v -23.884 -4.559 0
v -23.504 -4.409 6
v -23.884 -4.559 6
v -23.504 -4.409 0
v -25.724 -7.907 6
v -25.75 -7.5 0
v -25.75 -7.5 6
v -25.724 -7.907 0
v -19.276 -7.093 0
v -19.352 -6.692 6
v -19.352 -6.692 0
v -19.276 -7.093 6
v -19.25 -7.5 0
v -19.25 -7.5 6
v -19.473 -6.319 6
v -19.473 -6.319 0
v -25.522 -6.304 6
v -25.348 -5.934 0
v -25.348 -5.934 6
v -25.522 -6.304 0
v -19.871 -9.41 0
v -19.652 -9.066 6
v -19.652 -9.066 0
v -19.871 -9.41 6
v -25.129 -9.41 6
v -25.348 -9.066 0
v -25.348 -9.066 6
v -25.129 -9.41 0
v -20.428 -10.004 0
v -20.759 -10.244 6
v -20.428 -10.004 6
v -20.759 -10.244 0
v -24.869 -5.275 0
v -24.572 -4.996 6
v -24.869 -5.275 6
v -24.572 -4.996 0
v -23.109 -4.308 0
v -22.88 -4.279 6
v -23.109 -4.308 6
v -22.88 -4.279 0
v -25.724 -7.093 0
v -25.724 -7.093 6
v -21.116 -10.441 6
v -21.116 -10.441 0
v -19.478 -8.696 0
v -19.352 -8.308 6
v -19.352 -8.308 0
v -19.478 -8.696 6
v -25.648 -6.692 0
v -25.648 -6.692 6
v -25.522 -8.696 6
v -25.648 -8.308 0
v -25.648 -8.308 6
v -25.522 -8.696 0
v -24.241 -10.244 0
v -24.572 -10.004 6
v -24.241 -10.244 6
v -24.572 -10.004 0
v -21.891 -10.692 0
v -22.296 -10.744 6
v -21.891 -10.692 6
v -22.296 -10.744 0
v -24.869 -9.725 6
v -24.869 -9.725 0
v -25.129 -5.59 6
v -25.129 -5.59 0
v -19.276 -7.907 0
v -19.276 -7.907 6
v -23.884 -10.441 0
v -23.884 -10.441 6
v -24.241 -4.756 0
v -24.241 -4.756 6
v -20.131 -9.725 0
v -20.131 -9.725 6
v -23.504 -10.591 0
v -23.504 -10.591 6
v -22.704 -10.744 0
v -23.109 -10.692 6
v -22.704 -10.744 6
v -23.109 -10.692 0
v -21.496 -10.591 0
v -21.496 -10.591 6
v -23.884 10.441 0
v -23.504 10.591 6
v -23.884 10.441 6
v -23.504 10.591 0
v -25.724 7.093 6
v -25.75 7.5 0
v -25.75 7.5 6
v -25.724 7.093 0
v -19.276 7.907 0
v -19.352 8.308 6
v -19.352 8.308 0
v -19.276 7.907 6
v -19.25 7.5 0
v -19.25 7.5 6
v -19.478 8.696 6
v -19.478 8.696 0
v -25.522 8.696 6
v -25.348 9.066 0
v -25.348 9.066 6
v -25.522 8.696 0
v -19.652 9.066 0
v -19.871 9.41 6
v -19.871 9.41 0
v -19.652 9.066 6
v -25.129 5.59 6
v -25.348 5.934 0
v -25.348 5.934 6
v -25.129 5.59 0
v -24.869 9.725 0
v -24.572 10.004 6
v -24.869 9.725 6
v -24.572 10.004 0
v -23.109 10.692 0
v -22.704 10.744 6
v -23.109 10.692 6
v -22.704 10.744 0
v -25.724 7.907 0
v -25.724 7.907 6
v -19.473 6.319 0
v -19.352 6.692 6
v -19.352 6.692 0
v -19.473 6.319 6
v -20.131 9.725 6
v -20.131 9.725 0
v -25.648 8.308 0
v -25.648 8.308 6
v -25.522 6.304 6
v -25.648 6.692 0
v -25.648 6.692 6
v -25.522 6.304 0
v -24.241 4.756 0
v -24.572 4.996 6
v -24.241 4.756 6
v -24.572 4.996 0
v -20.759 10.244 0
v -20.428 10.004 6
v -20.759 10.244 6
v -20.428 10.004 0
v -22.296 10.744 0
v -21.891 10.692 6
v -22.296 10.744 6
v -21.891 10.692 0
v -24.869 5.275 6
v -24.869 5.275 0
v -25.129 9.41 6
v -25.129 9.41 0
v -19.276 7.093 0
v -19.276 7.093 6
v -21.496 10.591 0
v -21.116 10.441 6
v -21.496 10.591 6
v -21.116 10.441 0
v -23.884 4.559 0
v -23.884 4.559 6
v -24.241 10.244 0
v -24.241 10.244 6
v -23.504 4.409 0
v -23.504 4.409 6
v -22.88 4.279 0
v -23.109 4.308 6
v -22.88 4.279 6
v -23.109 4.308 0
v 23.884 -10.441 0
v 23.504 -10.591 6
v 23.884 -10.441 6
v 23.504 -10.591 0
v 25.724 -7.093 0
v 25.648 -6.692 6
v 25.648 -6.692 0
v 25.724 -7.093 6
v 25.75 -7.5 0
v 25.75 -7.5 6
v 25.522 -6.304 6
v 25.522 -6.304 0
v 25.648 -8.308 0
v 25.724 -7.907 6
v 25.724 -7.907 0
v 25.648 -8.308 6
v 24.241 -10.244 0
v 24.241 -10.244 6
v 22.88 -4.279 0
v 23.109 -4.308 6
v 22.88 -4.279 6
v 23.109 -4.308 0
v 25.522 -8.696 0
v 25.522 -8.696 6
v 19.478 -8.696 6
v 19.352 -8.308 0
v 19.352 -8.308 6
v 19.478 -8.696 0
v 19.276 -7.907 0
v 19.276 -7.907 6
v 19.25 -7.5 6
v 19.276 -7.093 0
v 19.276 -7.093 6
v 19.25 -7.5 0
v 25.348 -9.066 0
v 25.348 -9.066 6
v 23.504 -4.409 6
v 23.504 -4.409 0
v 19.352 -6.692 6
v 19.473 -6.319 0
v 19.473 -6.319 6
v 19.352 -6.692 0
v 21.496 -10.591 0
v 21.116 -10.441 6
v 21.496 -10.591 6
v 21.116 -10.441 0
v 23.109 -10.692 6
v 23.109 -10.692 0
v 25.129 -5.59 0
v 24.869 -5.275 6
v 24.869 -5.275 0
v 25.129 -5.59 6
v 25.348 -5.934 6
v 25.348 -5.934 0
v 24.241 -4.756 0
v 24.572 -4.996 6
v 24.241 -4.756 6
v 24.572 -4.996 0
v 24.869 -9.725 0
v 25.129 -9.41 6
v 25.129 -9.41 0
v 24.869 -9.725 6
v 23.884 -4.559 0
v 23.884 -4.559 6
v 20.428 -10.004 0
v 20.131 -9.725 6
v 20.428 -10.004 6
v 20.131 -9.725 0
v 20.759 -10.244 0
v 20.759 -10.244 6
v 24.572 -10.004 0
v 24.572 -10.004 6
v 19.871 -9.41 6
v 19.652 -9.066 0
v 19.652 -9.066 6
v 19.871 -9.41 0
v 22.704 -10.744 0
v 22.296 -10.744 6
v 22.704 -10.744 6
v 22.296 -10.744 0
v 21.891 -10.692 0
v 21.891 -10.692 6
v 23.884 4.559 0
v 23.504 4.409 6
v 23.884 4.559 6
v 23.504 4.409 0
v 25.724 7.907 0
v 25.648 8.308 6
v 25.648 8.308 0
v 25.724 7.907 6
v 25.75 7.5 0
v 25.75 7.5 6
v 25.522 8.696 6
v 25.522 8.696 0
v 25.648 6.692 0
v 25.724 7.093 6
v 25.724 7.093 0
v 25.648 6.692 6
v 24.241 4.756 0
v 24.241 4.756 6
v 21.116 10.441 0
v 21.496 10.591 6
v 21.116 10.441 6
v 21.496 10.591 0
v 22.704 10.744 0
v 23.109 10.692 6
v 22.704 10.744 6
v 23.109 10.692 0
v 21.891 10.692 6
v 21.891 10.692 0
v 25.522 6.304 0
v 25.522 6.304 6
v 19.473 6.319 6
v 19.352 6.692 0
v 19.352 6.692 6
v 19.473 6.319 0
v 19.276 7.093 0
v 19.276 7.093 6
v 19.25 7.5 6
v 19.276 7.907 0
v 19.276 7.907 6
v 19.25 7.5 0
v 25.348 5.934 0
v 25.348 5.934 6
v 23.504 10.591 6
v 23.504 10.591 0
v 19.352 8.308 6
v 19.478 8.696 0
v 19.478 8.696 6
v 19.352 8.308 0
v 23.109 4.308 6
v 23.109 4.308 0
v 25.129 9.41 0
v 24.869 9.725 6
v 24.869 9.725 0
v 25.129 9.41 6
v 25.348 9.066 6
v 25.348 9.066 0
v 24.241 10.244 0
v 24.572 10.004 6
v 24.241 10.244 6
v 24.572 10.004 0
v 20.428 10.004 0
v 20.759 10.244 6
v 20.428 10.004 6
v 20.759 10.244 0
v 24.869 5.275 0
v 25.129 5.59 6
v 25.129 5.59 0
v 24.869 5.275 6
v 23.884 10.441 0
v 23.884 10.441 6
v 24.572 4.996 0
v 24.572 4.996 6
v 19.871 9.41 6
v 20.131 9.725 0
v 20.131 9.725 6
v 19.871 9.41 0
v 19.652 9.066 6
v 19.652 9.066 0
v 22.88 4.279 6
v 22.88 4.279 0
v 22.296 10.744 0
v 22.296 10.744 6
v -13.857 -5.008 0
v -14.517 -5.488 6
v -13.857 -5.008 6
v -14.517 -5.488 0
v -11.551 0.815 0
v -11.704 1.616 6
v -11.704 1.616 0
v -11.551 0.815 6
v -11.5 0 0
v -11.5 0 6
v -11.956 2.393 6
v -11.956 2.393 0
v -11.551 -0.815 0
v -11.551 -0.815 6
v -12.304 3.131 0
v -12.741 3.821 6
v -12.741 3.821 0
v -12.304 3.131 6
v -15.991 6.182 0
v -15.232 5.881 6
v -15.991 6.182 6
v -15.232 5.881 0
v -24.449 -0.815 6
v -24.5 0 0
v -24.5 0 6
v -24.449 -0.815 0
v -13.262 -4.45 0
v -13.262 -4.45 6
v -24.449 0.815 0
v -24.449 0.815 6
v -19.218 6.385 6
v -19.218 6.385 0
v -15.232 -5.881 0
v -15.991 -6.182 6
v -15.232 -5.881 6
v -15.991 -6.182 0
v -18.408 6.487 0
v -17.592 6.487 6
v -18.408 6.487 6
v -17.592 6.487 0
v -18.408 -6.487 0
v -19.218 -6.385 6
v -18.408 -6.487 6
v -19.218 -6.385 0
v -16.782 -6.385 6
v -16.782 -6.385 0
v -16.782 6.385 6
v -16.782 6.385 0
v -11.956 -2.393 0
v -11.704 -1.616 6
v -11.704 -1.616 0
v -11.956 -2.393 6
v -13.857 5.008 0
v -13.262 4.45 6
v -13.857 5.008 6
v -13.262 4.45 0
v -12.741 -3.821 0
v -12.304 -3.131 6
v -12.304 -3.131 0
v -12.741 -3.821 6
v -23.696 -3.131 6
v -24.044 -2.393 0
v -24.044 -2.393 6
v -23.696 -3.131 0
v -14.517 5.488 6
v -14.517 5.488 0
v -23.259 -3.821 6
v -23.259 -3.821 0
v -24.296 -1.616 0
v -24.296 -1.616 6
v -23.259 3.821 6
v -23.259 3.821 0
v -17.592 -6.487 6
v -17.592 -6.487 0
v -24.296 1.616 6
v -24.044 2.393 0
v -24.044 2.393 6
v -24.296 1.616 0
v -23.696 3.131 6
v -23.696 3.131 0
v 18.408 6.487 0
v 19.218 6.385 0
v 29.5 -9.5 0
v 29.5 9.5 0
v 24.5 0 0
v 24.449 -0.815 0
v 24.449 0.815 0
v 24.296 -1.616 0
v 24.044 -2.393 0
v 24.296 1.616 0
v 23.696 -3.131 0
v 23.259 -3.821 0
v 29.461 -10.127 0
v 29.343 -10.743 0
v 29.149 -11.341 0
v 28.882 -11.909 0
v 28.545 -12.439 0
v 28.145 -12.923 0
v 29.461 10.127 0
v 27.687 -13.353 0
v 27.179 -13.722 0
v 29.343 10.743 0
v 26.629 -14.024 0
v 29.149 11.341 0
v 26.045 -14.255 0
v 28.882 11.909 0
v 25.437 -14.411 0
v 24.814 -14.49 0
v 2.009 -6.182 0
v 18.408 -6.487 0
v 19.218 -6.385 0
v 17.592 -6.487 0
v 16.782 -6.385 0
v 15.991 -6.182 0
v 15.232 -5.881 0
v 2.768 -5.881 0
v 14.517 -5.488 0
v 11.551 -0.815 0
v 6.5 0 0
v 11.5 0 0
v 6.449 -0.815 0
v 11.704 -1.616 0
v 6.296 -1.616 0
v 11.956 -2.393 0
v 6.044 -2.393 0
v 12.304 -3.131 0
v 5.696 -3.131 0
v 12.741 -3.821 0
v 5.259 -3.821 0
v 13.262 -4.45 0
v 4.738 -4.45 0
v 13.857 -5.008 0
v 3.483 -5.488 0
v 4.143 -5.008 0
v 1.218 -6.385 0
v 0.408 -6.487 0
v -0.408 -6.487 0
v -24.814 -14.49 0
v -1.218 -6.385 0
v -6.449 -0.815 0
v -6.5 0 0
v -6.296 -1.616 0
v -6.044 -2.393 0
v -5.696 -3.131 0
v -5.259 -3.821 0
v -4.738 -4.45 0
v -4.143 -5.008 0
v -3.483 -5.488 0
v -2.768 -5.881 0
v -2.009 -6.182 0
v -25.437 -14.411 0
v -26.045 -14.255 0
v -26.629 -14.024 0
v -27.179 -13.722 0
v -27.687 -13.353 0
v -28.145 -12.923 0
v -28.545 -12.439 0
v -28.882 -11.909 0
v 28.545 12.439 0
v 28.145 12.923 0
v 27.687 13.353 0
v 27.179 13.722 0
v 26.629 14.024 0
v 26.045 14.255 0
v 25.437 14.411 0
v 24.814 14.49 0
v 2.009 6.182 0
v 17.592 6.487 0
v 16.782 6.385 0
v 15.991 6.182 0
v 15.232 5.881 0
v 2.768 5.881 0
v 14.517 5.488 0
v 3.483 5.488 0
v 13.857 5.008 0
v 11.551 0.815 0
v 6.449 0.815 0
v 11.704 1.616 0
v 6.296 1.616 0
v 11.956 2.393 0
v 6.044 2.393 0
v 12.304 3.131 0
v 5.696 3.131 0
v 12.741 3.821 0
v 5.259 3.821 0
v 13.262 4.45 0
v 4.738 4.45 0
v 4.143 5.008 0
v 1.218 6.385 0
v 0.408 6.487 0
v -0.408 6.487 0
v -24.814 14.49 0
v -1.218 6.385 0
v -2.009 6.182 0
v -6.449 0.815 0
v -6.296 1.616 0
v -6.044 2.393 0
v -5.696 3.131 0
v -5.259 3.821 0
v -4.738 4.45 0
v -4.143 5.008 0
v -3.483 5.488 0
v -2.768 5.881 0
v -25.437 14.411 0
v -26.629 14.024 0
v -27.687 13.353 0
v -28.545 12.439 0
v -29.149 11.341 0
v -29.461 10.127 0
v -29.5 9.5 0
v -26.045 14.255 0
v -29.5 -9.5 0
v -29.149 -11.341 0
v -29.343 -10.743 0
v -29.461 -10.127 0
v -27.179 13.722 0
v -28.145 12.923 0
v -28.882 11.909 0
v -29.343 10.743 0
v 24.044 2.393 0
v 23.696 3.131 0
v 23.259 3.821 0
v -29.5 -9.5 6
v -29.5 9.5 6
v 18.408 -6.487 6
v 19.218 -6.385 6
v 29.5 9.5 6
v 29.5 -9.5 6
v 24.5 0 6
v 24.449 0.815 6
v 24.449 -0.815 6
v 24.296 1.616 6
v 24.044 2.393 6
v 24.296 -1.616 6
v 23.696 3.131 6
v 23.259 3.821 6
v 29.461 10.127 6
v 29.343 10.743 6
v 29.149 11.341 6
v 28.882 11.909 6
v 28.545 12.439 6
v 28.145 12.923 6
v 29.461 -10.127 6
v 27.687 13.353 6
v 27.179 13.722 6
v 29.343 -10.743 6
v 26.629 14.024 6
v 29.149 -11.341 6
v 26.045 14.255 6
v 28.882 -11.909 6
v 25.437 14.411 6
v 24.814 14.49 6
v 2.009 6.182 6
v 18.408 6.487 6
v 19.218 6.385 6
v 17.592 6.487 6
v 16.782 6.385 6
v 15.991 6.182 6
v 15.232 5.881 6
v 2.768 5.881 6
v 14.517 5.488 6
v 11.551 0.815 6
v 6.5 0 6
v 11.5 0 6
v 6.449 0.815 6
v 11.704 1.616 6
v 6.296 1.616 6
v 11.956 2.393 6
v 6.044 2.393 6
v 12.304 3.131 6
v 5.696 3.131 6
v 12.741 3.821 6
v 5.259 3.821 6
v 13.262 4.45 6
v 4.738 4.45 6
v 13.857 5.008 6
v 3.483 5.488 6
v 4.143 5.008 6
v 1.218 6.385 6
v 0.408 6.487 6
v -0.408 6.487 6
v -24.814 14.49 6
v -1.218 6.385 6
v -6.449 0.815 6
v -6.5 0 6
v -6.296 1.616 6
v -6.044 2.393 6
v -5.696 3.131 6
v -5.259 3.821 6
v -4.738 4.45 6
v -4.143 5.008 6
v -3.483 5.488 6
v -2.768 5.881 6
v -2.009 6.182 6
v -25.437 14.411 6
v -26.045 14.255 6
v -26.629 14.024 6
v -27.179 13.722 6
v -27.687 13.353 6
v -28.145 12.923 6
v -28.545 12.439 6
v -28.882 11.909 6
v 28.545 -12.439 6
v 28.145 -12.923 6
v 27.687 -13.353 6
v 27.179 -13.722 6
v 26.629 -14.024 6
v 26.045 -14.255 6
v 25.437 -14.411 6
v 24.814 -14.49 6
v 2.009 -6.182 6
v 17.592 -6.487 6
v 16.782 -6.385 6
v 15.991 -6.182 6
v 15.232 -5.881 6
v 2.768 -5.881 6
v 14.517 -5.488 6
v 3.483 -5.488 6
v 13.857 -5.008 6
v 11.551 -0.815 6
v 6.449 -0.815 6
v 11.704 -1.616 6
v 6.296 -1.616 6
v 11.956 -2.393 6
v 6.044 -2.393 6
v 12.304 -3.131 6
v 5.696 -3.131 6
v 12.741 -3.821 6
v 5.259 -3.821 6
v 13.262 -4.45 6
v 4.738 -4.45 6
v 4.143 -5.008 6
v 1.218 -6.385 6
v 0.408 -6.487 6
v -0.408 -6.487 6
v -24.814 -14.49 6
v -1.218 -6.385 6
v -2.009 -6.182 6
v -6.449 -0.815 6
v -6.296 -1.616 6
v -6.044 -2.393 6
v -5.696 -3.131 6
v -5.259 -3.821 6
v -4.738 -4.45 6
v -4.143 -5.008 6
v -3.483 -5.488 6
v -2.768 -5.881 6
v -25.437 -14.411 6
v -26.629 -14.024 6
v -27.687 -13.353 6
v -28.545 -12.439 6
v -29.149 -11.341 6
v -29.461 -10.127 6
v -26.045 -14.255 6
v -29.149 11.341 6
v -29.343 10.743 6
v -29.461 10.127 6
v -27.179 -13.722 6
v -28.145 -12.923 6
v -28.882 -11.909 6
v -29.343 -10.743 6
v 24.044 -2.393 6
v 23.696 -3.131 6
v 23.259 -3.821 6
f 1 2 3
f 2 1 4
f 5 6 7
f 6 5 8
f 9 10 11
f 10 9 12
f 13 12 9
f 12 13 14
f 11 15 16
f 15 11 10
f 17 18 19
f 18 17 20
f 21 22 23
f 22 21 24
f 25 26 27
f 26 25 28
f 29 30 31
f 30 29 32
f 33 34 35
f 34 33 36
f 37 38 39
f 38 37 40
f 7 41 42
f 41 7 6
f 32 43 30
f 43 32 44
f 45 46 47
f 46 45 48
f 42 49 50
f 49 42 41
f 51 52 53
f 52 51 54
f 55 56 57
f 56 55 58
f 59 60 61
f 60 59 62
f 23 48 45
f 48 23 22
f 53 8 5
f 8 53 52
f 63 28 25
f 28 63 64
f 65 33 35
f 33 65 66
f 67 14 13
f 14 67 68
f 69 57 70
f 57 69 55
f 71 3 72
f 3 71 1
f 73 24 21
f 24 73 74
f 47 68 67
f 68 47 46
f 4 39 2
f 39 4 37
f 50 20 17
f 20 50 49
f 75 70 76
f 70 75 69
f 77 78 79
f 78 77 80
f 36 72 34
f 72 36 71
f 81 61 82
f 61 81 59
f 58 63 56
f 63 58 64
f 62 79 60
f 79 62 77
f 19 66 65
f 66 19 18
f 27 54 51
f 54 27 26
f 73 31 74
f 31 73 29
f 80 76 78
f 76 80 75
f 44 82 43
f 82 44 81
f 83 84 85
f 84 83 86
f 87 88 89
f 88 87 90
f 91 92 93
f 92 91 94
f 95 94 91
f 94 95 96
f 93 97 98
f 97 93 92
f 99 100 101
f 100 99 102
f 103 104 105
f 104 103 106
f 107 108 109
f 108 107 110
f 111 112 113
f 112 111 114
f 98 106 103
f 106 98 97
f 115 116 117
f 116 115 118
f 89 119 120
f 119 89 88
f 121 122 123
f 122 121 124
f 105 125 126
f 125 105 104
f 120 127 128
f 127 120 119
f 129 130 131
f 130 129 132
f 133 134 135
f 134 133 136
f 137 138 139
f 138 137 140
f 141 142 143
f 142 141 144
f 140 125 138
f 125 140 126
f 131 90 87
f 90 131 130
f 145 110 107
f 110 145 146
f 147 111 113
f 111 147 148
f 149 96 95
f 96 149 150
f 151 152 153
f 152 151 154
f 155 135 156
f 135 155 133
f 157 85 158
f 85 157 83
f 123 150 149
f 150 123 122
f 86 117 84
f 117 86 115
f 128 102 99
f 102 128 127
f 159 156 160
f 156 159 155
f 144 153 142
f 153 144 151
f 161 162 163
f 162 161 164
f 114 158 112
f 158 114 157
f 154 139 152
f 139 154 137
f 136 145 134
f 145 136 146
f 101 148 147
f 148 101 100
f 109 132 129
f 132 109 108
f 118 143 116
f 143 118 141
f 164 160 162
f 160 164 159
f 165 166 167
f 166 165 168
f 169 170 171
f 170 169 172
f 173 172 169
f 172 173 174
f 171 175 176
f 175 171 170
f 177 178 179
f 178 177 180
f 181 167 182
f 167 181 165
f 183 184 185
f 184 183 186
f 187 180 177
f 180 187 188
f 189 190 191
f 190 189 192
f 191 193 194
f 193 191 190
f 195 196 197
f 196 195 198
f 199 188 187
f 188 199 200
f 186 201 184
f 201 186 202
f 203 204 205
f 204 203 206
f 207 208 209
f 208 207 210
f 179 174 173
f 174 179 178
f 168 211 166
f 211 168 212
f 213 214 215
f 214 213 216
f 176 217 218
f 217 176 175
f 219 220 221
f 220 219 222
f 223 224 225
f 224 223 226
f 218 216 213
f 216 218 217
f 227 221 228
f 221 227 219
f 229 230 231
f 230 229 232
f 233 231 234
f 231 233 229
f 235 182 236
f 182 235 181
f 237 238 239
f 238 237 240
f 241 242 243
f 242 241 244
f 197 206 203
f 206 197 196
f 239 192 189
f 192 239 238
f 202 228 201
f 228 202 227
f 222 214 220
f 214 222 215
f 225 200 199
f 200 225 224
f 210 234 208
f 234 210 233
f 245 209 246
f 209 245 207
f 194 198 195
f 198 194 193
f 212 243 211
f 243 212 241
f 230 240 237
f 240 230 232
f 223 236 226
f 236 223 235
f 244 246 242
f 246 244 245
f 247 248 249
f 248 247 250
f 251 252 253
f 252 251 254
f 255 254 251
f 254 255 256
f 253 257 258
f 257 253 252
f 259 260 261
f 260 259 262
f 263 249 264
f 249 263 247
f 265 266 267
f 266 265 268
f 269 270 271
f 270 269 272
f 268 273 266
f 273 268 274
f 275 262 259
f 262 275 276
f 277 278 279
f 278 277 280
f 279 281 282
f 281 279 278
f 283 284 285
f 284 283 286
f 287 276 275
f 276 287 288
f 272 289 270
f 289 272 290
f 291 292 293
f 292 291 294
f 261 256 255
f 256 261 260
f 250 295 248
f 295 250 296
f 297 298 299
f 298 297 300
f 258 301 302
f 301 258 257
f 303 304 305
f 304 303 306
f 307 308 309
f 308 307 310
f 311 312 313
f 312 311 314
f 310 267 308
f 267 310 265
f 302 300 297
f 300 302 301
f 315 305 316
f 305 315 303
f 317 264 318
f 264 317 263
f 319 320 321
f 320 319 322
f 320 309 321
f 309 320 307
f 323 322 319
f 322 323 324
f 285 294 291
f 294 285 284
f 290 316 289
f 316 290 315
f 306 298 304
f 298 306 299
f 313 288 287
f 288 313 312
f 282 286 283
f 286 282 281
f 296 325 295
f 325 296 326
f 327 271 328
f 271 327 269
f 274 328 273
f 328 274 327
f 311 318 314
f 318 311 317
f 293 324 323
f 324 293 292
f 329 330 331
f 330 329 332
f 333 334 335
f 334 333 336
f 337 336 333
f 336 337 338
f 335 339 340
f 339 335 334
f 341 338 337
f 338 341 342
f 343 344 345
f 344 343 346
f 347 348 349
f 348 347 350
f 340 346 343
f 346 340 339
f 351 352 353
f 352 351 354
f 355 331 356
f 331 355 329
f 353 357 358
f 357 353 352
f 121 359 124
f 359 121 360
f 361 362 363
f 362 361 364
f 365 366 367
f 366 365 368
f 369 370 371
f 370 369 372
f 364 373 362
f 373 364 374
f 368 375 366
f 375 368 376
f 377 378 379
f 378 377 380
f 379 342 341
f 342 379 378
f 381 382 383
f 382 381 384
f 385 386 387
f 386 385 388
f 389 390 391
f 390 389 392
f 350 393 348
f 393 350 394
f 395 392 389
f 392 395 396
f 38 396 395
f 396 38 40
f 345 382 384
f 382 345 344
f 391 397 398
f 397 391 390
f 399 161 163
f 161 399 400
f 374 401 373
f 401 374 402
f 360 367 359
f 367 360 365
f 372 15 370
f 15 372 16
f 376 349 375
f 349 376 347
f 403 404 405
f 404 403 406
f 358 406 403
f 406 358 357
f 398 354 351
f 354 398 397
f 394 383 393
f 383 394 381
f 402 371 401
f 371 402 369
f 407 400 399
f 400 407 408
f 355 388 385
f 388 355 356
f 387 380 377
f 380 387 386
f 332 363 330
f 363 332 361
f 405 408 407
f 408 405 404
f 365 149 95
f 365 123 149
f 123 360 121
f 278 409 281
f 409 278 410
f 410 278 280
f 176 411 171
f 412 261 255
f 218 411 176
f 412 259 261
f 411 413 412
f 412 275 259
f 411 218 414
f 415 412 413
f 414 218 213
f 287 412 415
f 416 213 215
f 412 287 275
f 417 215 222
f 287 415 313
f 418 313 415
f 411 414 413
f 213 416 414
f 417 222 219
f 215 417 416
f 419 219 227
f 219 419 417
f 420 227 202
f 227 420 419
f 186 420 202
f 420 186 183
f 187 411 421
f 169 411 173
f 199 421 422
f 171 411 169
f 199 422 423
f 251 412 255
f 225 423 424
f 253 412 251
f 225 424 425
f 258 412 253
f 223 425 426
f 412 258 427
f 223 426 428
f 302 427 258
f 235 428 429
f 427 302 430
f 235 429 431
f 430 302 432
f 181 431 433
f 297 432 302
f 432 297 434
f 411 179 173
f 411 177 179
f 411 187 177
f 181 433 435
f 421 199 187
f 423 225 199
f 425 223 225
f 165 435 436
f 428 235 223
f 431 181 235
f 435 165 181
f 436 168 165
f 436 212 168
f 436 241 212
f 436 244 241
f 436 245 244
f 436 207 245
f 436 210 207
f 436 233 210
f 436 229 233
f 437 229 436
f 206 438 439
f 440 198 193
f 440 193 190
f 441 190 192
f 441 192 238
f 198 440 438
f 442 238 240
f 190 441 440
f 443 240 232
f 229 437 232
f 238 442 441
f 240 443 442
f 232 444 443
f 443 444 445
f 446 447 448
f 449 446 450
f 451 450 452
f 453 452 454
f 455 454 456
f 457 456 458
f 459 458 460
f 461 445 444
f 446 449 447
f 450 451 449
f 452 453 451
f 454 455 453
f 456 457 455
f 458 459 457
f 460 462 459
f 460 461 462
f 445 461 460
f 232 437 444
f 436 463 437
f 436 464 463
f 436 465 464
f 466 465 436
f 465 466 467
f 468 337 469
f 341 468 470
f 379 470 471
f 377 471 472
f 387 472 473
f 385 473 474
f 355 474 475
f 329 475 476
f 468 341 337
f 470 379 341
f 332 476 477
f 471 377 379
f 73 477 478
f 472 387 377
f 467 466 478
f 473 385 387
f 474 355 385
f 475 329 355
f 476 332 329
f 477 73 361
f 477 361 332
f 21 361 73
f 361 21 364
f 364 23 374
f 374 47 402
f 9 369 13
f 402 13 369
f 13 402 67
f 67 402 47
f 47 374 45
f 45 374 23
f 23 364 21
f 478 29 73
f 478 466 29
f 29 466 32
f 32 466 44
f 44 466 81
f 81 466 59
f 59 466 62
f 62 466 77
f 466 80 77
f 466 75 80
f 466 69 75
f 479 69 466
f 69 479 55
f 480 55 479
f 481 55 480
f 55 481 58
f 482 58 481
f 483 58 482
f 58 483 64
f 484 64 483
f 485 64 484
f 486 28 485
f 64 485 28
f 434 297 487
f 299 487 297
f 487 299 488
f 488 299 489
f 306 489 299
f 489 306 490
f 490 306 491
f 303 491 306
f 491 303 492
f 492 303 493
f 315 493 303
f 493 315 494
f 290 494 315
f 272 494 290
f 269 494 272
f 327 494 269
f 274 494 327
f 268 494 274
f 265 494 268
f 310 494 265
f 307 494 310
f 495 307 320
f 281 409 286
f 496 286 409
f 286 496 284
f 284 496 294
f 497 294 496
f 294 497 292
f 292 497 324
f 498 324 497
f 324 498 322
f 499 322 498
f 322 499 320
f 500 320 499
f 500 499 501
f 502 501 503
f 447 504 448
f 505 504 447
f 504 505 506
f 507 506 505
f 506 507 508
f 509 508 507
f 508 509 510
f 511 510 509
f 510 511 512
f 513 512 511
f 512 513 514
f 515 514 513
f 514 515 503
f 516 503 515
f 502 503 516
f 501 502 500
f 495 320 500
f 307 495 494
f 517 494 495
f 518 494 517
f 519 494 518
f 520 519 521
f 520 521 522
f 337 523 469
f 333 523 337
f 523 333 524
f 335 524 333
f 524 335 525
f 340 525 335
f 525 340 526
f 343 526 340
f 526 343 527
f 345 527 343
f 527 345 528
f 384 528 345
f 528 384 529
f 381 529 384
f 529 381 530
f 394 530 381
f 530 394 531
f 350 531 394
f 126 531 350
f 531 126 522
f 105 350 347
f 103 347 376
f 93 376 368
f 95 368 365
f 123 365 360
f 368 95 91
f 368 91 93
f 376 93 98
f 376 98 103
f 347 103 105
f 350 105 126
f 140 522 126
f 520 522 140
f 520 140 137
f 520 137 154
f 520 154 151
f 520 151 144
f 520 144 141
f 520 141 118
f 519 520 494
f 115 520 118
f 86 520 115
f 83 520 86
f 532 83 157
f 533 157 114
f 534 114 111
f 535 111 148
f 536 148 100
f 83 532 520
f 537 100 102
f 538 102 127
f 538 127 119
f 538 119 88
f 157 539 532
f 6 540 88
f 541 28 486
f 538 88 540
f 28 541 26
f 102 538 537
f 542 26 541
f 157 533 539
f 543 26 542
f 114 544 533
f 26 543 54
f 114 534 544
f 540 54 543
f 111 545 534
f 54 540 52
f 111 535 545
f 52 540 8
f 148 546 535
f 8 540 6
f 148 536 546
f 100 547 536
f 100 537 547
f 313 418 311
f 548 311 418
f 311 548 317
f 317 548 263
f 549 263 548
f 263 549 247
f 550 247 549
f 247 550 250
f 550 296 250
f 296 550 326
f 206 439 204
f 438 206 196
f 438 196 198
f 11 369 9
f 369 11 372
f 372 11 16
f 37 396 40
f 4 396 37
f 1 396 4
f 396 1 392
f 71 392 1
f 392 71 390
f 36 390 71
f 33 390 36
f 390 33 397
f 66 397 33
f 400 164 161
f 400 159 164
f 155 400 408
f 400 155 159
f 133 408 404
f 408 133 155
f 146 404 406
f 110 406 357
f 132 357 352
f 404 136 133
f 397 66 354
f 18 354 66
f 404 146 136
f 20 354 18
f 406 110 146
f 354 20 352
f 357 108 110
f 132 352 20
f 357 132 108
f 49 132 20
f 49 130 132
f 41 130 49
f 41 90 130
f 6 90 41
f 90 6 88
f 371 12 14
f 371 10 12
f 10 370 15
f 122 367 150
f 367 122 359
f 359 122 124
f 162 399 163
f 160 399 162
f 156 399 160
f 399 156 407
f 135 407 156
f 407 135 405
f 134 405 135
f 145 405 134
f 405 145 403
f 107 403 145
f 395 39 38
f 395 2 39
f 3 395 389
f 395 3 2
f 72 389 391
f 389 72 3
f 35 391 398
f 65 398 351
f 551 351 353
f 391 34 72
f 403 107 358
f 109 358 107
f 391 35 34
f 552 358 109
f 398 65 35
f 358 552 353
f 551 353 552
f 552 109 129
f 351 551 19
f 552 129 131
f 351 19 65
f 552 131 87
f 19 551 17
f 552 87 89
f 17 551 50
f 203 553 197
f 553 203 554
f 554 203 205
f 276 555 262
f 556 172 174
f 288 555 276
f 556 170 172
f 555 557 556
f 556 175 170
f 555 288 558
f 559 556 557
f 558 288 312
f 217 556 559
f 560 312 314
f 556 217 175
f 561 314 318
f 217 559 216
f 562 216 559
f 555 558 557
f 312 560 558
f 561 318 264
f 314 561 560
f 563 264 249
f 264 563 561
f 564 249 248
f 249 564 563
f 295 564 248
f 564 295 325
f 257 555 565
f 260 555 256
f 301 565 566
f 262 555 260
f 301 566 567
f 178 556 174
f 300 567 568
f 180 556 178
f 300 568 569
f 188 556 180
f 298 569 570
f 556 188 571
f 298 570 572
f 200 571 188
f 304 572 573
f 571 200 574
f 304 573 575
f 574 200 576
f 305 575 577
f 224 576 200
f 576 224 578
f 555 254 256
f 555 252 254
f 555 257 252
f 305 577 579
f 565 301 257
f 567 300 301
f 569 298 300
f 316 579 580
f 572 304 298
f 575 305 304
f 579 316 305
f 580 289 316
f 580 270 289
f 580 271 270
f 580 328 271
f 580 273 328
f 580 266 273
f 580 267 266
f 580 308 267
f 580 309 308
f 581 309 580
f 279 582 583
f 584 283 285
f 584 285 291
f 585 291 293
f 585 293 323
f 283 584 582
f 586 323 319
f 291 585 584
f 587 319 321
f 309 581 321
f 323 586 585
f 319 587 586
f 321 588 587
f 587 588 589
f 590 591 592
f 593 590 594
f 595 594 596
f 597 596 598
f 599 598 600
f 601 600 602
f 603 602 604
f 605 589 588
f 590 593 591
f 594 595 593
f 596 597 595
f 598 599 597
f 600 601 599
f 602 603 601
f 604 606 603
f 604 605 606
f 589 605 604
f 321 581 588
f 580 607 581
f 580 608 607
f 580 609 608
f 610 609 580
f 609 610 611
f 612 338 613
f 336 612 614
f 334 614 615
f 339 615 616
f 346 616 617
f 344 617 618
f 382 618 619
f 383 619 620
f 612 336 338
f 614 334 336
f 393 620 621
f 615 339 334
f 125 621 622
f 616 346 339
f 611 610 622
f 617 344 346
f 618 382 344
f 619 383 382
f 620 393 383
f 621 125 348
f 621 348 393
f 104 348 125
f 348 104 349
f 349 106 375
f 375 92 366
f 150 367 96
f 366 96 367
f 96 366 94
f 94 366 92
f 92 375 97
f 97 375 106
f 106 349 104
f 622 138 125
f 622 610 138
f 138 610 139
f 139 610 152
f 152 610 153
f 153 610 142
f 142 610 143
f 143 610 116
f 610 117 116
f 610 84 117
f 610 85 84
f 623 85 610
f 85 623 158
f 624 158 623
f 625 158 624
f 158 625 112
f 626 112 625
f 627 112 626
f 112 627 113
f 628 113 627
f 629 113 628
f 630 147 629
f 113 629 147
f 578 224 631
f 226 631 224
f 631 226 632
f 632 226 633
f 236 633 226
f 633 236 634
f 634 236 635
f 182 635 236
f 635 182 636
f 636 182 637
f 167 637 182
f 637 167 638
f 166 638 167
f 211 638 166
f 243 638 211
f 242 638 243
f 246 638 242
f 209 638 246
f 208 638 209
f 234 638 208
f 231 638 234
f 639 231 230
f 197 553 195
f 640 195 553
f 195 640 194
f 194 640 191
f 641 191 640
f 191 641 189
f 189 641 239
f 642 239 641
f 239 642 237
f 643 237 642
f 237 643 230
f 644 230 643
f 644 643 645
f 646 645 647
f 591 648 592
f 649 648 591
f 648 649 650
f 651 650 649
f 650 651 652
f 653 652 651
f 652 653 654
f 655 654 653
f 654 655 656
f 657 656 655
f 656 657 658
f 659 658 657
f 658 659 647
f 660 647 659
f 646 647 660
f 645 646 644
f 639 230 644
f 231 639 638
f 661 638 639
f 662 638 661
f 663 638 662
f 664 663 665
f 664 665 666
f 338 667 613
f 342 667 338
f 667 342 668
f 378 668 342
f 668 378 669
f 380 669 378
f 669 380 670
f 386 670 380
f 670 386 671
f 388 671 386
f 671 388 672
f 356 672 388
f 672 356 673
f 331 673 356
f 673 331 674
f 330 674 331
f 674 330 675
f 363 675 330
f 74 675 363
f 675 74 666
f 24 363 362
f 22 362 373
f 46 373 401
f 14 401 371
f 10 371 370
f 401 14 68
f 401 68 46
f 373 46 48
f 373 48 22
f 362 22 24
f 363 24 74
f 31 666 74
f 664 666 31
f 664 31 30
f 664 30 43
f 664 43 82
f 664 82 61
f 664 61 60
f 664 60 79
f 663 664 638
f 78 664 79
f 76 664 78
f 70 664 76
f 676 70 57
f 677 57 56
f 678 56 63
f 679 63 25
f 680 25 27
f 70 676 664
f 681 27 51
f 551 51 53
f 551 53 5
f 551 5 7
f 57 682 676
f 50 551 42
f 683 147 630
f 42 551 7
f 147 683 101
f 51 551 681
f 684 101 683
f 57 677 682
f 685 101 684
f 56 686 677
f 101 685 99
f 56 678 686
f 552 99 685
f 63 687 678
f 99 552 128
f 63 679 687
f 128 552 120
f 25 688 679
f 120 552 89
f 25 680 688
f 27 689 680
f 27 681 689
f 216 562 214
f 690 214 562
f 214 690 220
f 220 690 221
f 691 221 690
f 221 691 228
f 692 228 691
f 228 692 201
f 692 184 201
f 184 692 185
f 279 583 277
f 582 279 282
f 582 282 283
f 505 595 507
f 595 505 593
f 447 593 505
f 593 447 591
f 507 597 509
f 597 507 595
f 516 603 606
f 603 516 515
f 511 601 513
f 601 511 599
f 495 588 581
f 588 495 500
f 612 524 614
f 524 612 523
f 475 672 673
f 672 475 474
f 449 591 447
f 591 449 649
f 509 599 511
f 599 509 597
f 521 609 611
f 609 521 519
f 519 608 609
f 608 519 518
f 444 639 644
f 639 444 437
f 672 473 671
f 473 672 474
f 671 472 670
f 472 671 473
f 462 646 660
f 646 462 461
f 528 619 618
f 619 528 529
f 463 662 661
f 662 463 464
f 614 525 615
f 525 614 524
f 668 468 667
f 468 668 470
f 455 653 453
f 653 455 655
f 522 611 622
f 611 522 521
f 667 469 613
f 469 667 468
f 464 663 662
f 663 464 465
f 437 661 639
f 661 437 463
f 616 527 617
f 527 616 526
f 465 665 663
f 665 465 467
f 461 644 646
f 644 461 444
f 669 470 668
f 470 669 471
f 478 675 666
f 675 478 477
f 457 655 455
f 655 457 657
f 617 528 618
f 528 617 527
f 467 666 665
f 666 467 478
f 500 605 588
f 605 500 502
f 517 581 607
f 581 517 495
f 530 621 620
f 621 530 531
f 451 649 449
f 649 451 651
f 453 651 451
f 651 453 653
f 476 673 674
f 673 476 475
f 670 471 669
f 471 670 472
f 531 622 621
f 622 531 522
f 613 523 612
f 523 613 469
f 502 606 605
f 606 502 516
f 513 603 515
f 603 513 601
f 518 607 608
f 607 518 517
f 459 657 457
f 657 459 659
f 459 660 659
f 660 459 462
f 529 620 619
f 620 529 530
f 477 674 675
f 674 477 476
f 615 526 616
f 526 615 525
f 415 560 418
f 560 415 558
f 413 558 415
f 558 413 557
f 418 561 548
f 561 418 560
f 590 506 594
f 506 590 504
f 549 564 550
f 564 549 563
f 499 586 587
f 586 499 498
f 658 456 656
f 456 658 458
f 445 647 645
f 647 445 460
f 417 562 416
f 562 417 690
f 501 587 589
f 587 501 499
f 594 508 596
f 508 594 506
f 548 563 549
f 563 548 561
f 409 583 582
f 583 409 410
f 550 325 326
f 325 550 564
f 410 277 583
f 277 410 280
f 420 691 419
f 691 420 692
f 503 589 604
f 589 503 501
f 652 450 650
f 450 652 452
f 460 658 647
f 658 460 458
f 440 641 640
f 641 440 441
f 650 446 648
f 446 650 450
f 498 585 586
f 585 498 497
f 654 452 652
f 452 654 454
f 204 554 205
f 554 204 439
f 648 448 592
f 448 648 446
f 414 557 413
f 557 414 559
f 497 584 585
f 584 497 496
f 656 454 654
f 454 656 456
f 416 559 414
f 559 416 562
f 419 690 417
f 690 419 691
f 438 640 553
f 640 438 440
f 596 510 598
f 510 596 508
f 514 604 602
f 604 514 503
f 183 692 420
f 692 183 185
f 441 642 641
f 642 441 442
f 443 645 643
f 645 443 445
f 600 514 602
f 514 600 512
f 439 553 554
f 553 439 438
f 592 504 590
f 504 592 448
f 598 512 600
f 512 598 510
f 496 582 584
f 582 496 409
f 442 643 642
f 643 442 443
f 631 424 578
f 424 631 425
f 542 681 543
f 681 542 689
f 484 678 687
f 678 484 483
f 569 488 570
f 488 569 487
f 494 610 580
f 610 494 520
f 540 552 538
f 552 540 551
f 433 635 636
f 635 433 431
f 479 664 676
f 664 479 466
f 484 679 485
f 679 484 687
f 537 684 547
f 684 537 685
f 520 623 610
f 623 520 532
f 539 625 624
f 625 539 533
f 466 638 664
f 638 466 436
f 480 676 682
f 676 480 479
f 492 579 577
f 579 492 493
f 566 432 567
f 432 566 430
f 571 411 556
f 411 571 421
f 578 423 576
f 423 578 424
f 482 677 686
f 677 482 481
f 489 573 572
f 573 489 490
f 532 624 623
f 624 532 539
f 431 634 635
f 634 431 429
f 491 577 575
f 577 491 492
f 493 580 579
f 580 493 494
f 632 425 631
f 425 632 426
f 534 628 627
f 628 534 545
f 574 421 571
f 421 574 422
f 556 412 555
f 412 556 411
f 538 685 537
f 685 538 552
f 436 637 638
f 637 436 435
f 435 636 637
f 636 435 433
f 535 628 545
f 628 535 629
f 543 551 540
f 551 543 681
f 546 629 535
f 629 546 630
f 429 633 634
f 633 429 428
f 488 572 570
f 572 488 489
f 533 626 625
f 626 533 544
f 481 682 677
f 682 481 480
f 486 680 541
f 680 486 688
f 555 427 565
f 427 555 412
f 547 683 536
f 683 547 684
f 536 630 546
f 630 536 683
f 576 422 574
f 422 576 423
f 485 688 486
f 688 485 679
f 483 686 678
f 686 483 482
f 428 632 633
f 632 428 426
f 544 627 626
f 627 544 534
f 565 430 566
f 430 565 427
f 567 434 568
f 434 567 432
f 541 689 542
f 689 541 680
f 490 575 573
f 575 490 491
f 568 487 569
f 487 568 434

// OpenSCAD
$fn = 50;


difference() {
	union() {
		hull() {
			translate(v = [-24.5000000000, 9.5000000000, 0]) {
				cylinder(h = 6, r = 5);
			}
			translate(v = [24.5000000000, 9.5000000000, 0]) {
				cylinder(h = 6, r = 5);
			}
			translate(v = [-24.5000000000, -9.5000000000, 0]) {
				cylinder(h = 6, r = 5);
			}
			translate(v = [24.5000000000, -9.5000000000, 0]) {
				cylinder(h = 6, r = 5);
			}
		}
	}
	union() {
		#translate(v = [-22.5000000000, -7.5000000000, -100.0000000000]) {
			cylinder(h = 200, r = 3.2500000000);
		}
		#translate(v = [-22.5000000000, 7.5000000000, -100.0000000000]) {
			cylinder(h = 200, r = 3.2500000000);
		}
		#translate(v = [22.5000000000, -7.5000000000, -100.0000000000]) {
			cylinder(h = 200, r = 3.2500000000);
		}
		#translate(v = [22.5000000000, 7.5000000000, -100.0000000000]) {
			cylinder(h = 200, r = 3.2500000000);
		}
		#translate(v = [-18.0000000000, 0, 0]) {
			cylinder(h = 6, r = 6.5000000000);
		}
		#cylinder(h = 6, r = 6.5000000000);
		#translate(v = [18.0000000000, 0, 0]) {
			cylinder(h = 6, r = 6.5000000000);
		}
	}
}
